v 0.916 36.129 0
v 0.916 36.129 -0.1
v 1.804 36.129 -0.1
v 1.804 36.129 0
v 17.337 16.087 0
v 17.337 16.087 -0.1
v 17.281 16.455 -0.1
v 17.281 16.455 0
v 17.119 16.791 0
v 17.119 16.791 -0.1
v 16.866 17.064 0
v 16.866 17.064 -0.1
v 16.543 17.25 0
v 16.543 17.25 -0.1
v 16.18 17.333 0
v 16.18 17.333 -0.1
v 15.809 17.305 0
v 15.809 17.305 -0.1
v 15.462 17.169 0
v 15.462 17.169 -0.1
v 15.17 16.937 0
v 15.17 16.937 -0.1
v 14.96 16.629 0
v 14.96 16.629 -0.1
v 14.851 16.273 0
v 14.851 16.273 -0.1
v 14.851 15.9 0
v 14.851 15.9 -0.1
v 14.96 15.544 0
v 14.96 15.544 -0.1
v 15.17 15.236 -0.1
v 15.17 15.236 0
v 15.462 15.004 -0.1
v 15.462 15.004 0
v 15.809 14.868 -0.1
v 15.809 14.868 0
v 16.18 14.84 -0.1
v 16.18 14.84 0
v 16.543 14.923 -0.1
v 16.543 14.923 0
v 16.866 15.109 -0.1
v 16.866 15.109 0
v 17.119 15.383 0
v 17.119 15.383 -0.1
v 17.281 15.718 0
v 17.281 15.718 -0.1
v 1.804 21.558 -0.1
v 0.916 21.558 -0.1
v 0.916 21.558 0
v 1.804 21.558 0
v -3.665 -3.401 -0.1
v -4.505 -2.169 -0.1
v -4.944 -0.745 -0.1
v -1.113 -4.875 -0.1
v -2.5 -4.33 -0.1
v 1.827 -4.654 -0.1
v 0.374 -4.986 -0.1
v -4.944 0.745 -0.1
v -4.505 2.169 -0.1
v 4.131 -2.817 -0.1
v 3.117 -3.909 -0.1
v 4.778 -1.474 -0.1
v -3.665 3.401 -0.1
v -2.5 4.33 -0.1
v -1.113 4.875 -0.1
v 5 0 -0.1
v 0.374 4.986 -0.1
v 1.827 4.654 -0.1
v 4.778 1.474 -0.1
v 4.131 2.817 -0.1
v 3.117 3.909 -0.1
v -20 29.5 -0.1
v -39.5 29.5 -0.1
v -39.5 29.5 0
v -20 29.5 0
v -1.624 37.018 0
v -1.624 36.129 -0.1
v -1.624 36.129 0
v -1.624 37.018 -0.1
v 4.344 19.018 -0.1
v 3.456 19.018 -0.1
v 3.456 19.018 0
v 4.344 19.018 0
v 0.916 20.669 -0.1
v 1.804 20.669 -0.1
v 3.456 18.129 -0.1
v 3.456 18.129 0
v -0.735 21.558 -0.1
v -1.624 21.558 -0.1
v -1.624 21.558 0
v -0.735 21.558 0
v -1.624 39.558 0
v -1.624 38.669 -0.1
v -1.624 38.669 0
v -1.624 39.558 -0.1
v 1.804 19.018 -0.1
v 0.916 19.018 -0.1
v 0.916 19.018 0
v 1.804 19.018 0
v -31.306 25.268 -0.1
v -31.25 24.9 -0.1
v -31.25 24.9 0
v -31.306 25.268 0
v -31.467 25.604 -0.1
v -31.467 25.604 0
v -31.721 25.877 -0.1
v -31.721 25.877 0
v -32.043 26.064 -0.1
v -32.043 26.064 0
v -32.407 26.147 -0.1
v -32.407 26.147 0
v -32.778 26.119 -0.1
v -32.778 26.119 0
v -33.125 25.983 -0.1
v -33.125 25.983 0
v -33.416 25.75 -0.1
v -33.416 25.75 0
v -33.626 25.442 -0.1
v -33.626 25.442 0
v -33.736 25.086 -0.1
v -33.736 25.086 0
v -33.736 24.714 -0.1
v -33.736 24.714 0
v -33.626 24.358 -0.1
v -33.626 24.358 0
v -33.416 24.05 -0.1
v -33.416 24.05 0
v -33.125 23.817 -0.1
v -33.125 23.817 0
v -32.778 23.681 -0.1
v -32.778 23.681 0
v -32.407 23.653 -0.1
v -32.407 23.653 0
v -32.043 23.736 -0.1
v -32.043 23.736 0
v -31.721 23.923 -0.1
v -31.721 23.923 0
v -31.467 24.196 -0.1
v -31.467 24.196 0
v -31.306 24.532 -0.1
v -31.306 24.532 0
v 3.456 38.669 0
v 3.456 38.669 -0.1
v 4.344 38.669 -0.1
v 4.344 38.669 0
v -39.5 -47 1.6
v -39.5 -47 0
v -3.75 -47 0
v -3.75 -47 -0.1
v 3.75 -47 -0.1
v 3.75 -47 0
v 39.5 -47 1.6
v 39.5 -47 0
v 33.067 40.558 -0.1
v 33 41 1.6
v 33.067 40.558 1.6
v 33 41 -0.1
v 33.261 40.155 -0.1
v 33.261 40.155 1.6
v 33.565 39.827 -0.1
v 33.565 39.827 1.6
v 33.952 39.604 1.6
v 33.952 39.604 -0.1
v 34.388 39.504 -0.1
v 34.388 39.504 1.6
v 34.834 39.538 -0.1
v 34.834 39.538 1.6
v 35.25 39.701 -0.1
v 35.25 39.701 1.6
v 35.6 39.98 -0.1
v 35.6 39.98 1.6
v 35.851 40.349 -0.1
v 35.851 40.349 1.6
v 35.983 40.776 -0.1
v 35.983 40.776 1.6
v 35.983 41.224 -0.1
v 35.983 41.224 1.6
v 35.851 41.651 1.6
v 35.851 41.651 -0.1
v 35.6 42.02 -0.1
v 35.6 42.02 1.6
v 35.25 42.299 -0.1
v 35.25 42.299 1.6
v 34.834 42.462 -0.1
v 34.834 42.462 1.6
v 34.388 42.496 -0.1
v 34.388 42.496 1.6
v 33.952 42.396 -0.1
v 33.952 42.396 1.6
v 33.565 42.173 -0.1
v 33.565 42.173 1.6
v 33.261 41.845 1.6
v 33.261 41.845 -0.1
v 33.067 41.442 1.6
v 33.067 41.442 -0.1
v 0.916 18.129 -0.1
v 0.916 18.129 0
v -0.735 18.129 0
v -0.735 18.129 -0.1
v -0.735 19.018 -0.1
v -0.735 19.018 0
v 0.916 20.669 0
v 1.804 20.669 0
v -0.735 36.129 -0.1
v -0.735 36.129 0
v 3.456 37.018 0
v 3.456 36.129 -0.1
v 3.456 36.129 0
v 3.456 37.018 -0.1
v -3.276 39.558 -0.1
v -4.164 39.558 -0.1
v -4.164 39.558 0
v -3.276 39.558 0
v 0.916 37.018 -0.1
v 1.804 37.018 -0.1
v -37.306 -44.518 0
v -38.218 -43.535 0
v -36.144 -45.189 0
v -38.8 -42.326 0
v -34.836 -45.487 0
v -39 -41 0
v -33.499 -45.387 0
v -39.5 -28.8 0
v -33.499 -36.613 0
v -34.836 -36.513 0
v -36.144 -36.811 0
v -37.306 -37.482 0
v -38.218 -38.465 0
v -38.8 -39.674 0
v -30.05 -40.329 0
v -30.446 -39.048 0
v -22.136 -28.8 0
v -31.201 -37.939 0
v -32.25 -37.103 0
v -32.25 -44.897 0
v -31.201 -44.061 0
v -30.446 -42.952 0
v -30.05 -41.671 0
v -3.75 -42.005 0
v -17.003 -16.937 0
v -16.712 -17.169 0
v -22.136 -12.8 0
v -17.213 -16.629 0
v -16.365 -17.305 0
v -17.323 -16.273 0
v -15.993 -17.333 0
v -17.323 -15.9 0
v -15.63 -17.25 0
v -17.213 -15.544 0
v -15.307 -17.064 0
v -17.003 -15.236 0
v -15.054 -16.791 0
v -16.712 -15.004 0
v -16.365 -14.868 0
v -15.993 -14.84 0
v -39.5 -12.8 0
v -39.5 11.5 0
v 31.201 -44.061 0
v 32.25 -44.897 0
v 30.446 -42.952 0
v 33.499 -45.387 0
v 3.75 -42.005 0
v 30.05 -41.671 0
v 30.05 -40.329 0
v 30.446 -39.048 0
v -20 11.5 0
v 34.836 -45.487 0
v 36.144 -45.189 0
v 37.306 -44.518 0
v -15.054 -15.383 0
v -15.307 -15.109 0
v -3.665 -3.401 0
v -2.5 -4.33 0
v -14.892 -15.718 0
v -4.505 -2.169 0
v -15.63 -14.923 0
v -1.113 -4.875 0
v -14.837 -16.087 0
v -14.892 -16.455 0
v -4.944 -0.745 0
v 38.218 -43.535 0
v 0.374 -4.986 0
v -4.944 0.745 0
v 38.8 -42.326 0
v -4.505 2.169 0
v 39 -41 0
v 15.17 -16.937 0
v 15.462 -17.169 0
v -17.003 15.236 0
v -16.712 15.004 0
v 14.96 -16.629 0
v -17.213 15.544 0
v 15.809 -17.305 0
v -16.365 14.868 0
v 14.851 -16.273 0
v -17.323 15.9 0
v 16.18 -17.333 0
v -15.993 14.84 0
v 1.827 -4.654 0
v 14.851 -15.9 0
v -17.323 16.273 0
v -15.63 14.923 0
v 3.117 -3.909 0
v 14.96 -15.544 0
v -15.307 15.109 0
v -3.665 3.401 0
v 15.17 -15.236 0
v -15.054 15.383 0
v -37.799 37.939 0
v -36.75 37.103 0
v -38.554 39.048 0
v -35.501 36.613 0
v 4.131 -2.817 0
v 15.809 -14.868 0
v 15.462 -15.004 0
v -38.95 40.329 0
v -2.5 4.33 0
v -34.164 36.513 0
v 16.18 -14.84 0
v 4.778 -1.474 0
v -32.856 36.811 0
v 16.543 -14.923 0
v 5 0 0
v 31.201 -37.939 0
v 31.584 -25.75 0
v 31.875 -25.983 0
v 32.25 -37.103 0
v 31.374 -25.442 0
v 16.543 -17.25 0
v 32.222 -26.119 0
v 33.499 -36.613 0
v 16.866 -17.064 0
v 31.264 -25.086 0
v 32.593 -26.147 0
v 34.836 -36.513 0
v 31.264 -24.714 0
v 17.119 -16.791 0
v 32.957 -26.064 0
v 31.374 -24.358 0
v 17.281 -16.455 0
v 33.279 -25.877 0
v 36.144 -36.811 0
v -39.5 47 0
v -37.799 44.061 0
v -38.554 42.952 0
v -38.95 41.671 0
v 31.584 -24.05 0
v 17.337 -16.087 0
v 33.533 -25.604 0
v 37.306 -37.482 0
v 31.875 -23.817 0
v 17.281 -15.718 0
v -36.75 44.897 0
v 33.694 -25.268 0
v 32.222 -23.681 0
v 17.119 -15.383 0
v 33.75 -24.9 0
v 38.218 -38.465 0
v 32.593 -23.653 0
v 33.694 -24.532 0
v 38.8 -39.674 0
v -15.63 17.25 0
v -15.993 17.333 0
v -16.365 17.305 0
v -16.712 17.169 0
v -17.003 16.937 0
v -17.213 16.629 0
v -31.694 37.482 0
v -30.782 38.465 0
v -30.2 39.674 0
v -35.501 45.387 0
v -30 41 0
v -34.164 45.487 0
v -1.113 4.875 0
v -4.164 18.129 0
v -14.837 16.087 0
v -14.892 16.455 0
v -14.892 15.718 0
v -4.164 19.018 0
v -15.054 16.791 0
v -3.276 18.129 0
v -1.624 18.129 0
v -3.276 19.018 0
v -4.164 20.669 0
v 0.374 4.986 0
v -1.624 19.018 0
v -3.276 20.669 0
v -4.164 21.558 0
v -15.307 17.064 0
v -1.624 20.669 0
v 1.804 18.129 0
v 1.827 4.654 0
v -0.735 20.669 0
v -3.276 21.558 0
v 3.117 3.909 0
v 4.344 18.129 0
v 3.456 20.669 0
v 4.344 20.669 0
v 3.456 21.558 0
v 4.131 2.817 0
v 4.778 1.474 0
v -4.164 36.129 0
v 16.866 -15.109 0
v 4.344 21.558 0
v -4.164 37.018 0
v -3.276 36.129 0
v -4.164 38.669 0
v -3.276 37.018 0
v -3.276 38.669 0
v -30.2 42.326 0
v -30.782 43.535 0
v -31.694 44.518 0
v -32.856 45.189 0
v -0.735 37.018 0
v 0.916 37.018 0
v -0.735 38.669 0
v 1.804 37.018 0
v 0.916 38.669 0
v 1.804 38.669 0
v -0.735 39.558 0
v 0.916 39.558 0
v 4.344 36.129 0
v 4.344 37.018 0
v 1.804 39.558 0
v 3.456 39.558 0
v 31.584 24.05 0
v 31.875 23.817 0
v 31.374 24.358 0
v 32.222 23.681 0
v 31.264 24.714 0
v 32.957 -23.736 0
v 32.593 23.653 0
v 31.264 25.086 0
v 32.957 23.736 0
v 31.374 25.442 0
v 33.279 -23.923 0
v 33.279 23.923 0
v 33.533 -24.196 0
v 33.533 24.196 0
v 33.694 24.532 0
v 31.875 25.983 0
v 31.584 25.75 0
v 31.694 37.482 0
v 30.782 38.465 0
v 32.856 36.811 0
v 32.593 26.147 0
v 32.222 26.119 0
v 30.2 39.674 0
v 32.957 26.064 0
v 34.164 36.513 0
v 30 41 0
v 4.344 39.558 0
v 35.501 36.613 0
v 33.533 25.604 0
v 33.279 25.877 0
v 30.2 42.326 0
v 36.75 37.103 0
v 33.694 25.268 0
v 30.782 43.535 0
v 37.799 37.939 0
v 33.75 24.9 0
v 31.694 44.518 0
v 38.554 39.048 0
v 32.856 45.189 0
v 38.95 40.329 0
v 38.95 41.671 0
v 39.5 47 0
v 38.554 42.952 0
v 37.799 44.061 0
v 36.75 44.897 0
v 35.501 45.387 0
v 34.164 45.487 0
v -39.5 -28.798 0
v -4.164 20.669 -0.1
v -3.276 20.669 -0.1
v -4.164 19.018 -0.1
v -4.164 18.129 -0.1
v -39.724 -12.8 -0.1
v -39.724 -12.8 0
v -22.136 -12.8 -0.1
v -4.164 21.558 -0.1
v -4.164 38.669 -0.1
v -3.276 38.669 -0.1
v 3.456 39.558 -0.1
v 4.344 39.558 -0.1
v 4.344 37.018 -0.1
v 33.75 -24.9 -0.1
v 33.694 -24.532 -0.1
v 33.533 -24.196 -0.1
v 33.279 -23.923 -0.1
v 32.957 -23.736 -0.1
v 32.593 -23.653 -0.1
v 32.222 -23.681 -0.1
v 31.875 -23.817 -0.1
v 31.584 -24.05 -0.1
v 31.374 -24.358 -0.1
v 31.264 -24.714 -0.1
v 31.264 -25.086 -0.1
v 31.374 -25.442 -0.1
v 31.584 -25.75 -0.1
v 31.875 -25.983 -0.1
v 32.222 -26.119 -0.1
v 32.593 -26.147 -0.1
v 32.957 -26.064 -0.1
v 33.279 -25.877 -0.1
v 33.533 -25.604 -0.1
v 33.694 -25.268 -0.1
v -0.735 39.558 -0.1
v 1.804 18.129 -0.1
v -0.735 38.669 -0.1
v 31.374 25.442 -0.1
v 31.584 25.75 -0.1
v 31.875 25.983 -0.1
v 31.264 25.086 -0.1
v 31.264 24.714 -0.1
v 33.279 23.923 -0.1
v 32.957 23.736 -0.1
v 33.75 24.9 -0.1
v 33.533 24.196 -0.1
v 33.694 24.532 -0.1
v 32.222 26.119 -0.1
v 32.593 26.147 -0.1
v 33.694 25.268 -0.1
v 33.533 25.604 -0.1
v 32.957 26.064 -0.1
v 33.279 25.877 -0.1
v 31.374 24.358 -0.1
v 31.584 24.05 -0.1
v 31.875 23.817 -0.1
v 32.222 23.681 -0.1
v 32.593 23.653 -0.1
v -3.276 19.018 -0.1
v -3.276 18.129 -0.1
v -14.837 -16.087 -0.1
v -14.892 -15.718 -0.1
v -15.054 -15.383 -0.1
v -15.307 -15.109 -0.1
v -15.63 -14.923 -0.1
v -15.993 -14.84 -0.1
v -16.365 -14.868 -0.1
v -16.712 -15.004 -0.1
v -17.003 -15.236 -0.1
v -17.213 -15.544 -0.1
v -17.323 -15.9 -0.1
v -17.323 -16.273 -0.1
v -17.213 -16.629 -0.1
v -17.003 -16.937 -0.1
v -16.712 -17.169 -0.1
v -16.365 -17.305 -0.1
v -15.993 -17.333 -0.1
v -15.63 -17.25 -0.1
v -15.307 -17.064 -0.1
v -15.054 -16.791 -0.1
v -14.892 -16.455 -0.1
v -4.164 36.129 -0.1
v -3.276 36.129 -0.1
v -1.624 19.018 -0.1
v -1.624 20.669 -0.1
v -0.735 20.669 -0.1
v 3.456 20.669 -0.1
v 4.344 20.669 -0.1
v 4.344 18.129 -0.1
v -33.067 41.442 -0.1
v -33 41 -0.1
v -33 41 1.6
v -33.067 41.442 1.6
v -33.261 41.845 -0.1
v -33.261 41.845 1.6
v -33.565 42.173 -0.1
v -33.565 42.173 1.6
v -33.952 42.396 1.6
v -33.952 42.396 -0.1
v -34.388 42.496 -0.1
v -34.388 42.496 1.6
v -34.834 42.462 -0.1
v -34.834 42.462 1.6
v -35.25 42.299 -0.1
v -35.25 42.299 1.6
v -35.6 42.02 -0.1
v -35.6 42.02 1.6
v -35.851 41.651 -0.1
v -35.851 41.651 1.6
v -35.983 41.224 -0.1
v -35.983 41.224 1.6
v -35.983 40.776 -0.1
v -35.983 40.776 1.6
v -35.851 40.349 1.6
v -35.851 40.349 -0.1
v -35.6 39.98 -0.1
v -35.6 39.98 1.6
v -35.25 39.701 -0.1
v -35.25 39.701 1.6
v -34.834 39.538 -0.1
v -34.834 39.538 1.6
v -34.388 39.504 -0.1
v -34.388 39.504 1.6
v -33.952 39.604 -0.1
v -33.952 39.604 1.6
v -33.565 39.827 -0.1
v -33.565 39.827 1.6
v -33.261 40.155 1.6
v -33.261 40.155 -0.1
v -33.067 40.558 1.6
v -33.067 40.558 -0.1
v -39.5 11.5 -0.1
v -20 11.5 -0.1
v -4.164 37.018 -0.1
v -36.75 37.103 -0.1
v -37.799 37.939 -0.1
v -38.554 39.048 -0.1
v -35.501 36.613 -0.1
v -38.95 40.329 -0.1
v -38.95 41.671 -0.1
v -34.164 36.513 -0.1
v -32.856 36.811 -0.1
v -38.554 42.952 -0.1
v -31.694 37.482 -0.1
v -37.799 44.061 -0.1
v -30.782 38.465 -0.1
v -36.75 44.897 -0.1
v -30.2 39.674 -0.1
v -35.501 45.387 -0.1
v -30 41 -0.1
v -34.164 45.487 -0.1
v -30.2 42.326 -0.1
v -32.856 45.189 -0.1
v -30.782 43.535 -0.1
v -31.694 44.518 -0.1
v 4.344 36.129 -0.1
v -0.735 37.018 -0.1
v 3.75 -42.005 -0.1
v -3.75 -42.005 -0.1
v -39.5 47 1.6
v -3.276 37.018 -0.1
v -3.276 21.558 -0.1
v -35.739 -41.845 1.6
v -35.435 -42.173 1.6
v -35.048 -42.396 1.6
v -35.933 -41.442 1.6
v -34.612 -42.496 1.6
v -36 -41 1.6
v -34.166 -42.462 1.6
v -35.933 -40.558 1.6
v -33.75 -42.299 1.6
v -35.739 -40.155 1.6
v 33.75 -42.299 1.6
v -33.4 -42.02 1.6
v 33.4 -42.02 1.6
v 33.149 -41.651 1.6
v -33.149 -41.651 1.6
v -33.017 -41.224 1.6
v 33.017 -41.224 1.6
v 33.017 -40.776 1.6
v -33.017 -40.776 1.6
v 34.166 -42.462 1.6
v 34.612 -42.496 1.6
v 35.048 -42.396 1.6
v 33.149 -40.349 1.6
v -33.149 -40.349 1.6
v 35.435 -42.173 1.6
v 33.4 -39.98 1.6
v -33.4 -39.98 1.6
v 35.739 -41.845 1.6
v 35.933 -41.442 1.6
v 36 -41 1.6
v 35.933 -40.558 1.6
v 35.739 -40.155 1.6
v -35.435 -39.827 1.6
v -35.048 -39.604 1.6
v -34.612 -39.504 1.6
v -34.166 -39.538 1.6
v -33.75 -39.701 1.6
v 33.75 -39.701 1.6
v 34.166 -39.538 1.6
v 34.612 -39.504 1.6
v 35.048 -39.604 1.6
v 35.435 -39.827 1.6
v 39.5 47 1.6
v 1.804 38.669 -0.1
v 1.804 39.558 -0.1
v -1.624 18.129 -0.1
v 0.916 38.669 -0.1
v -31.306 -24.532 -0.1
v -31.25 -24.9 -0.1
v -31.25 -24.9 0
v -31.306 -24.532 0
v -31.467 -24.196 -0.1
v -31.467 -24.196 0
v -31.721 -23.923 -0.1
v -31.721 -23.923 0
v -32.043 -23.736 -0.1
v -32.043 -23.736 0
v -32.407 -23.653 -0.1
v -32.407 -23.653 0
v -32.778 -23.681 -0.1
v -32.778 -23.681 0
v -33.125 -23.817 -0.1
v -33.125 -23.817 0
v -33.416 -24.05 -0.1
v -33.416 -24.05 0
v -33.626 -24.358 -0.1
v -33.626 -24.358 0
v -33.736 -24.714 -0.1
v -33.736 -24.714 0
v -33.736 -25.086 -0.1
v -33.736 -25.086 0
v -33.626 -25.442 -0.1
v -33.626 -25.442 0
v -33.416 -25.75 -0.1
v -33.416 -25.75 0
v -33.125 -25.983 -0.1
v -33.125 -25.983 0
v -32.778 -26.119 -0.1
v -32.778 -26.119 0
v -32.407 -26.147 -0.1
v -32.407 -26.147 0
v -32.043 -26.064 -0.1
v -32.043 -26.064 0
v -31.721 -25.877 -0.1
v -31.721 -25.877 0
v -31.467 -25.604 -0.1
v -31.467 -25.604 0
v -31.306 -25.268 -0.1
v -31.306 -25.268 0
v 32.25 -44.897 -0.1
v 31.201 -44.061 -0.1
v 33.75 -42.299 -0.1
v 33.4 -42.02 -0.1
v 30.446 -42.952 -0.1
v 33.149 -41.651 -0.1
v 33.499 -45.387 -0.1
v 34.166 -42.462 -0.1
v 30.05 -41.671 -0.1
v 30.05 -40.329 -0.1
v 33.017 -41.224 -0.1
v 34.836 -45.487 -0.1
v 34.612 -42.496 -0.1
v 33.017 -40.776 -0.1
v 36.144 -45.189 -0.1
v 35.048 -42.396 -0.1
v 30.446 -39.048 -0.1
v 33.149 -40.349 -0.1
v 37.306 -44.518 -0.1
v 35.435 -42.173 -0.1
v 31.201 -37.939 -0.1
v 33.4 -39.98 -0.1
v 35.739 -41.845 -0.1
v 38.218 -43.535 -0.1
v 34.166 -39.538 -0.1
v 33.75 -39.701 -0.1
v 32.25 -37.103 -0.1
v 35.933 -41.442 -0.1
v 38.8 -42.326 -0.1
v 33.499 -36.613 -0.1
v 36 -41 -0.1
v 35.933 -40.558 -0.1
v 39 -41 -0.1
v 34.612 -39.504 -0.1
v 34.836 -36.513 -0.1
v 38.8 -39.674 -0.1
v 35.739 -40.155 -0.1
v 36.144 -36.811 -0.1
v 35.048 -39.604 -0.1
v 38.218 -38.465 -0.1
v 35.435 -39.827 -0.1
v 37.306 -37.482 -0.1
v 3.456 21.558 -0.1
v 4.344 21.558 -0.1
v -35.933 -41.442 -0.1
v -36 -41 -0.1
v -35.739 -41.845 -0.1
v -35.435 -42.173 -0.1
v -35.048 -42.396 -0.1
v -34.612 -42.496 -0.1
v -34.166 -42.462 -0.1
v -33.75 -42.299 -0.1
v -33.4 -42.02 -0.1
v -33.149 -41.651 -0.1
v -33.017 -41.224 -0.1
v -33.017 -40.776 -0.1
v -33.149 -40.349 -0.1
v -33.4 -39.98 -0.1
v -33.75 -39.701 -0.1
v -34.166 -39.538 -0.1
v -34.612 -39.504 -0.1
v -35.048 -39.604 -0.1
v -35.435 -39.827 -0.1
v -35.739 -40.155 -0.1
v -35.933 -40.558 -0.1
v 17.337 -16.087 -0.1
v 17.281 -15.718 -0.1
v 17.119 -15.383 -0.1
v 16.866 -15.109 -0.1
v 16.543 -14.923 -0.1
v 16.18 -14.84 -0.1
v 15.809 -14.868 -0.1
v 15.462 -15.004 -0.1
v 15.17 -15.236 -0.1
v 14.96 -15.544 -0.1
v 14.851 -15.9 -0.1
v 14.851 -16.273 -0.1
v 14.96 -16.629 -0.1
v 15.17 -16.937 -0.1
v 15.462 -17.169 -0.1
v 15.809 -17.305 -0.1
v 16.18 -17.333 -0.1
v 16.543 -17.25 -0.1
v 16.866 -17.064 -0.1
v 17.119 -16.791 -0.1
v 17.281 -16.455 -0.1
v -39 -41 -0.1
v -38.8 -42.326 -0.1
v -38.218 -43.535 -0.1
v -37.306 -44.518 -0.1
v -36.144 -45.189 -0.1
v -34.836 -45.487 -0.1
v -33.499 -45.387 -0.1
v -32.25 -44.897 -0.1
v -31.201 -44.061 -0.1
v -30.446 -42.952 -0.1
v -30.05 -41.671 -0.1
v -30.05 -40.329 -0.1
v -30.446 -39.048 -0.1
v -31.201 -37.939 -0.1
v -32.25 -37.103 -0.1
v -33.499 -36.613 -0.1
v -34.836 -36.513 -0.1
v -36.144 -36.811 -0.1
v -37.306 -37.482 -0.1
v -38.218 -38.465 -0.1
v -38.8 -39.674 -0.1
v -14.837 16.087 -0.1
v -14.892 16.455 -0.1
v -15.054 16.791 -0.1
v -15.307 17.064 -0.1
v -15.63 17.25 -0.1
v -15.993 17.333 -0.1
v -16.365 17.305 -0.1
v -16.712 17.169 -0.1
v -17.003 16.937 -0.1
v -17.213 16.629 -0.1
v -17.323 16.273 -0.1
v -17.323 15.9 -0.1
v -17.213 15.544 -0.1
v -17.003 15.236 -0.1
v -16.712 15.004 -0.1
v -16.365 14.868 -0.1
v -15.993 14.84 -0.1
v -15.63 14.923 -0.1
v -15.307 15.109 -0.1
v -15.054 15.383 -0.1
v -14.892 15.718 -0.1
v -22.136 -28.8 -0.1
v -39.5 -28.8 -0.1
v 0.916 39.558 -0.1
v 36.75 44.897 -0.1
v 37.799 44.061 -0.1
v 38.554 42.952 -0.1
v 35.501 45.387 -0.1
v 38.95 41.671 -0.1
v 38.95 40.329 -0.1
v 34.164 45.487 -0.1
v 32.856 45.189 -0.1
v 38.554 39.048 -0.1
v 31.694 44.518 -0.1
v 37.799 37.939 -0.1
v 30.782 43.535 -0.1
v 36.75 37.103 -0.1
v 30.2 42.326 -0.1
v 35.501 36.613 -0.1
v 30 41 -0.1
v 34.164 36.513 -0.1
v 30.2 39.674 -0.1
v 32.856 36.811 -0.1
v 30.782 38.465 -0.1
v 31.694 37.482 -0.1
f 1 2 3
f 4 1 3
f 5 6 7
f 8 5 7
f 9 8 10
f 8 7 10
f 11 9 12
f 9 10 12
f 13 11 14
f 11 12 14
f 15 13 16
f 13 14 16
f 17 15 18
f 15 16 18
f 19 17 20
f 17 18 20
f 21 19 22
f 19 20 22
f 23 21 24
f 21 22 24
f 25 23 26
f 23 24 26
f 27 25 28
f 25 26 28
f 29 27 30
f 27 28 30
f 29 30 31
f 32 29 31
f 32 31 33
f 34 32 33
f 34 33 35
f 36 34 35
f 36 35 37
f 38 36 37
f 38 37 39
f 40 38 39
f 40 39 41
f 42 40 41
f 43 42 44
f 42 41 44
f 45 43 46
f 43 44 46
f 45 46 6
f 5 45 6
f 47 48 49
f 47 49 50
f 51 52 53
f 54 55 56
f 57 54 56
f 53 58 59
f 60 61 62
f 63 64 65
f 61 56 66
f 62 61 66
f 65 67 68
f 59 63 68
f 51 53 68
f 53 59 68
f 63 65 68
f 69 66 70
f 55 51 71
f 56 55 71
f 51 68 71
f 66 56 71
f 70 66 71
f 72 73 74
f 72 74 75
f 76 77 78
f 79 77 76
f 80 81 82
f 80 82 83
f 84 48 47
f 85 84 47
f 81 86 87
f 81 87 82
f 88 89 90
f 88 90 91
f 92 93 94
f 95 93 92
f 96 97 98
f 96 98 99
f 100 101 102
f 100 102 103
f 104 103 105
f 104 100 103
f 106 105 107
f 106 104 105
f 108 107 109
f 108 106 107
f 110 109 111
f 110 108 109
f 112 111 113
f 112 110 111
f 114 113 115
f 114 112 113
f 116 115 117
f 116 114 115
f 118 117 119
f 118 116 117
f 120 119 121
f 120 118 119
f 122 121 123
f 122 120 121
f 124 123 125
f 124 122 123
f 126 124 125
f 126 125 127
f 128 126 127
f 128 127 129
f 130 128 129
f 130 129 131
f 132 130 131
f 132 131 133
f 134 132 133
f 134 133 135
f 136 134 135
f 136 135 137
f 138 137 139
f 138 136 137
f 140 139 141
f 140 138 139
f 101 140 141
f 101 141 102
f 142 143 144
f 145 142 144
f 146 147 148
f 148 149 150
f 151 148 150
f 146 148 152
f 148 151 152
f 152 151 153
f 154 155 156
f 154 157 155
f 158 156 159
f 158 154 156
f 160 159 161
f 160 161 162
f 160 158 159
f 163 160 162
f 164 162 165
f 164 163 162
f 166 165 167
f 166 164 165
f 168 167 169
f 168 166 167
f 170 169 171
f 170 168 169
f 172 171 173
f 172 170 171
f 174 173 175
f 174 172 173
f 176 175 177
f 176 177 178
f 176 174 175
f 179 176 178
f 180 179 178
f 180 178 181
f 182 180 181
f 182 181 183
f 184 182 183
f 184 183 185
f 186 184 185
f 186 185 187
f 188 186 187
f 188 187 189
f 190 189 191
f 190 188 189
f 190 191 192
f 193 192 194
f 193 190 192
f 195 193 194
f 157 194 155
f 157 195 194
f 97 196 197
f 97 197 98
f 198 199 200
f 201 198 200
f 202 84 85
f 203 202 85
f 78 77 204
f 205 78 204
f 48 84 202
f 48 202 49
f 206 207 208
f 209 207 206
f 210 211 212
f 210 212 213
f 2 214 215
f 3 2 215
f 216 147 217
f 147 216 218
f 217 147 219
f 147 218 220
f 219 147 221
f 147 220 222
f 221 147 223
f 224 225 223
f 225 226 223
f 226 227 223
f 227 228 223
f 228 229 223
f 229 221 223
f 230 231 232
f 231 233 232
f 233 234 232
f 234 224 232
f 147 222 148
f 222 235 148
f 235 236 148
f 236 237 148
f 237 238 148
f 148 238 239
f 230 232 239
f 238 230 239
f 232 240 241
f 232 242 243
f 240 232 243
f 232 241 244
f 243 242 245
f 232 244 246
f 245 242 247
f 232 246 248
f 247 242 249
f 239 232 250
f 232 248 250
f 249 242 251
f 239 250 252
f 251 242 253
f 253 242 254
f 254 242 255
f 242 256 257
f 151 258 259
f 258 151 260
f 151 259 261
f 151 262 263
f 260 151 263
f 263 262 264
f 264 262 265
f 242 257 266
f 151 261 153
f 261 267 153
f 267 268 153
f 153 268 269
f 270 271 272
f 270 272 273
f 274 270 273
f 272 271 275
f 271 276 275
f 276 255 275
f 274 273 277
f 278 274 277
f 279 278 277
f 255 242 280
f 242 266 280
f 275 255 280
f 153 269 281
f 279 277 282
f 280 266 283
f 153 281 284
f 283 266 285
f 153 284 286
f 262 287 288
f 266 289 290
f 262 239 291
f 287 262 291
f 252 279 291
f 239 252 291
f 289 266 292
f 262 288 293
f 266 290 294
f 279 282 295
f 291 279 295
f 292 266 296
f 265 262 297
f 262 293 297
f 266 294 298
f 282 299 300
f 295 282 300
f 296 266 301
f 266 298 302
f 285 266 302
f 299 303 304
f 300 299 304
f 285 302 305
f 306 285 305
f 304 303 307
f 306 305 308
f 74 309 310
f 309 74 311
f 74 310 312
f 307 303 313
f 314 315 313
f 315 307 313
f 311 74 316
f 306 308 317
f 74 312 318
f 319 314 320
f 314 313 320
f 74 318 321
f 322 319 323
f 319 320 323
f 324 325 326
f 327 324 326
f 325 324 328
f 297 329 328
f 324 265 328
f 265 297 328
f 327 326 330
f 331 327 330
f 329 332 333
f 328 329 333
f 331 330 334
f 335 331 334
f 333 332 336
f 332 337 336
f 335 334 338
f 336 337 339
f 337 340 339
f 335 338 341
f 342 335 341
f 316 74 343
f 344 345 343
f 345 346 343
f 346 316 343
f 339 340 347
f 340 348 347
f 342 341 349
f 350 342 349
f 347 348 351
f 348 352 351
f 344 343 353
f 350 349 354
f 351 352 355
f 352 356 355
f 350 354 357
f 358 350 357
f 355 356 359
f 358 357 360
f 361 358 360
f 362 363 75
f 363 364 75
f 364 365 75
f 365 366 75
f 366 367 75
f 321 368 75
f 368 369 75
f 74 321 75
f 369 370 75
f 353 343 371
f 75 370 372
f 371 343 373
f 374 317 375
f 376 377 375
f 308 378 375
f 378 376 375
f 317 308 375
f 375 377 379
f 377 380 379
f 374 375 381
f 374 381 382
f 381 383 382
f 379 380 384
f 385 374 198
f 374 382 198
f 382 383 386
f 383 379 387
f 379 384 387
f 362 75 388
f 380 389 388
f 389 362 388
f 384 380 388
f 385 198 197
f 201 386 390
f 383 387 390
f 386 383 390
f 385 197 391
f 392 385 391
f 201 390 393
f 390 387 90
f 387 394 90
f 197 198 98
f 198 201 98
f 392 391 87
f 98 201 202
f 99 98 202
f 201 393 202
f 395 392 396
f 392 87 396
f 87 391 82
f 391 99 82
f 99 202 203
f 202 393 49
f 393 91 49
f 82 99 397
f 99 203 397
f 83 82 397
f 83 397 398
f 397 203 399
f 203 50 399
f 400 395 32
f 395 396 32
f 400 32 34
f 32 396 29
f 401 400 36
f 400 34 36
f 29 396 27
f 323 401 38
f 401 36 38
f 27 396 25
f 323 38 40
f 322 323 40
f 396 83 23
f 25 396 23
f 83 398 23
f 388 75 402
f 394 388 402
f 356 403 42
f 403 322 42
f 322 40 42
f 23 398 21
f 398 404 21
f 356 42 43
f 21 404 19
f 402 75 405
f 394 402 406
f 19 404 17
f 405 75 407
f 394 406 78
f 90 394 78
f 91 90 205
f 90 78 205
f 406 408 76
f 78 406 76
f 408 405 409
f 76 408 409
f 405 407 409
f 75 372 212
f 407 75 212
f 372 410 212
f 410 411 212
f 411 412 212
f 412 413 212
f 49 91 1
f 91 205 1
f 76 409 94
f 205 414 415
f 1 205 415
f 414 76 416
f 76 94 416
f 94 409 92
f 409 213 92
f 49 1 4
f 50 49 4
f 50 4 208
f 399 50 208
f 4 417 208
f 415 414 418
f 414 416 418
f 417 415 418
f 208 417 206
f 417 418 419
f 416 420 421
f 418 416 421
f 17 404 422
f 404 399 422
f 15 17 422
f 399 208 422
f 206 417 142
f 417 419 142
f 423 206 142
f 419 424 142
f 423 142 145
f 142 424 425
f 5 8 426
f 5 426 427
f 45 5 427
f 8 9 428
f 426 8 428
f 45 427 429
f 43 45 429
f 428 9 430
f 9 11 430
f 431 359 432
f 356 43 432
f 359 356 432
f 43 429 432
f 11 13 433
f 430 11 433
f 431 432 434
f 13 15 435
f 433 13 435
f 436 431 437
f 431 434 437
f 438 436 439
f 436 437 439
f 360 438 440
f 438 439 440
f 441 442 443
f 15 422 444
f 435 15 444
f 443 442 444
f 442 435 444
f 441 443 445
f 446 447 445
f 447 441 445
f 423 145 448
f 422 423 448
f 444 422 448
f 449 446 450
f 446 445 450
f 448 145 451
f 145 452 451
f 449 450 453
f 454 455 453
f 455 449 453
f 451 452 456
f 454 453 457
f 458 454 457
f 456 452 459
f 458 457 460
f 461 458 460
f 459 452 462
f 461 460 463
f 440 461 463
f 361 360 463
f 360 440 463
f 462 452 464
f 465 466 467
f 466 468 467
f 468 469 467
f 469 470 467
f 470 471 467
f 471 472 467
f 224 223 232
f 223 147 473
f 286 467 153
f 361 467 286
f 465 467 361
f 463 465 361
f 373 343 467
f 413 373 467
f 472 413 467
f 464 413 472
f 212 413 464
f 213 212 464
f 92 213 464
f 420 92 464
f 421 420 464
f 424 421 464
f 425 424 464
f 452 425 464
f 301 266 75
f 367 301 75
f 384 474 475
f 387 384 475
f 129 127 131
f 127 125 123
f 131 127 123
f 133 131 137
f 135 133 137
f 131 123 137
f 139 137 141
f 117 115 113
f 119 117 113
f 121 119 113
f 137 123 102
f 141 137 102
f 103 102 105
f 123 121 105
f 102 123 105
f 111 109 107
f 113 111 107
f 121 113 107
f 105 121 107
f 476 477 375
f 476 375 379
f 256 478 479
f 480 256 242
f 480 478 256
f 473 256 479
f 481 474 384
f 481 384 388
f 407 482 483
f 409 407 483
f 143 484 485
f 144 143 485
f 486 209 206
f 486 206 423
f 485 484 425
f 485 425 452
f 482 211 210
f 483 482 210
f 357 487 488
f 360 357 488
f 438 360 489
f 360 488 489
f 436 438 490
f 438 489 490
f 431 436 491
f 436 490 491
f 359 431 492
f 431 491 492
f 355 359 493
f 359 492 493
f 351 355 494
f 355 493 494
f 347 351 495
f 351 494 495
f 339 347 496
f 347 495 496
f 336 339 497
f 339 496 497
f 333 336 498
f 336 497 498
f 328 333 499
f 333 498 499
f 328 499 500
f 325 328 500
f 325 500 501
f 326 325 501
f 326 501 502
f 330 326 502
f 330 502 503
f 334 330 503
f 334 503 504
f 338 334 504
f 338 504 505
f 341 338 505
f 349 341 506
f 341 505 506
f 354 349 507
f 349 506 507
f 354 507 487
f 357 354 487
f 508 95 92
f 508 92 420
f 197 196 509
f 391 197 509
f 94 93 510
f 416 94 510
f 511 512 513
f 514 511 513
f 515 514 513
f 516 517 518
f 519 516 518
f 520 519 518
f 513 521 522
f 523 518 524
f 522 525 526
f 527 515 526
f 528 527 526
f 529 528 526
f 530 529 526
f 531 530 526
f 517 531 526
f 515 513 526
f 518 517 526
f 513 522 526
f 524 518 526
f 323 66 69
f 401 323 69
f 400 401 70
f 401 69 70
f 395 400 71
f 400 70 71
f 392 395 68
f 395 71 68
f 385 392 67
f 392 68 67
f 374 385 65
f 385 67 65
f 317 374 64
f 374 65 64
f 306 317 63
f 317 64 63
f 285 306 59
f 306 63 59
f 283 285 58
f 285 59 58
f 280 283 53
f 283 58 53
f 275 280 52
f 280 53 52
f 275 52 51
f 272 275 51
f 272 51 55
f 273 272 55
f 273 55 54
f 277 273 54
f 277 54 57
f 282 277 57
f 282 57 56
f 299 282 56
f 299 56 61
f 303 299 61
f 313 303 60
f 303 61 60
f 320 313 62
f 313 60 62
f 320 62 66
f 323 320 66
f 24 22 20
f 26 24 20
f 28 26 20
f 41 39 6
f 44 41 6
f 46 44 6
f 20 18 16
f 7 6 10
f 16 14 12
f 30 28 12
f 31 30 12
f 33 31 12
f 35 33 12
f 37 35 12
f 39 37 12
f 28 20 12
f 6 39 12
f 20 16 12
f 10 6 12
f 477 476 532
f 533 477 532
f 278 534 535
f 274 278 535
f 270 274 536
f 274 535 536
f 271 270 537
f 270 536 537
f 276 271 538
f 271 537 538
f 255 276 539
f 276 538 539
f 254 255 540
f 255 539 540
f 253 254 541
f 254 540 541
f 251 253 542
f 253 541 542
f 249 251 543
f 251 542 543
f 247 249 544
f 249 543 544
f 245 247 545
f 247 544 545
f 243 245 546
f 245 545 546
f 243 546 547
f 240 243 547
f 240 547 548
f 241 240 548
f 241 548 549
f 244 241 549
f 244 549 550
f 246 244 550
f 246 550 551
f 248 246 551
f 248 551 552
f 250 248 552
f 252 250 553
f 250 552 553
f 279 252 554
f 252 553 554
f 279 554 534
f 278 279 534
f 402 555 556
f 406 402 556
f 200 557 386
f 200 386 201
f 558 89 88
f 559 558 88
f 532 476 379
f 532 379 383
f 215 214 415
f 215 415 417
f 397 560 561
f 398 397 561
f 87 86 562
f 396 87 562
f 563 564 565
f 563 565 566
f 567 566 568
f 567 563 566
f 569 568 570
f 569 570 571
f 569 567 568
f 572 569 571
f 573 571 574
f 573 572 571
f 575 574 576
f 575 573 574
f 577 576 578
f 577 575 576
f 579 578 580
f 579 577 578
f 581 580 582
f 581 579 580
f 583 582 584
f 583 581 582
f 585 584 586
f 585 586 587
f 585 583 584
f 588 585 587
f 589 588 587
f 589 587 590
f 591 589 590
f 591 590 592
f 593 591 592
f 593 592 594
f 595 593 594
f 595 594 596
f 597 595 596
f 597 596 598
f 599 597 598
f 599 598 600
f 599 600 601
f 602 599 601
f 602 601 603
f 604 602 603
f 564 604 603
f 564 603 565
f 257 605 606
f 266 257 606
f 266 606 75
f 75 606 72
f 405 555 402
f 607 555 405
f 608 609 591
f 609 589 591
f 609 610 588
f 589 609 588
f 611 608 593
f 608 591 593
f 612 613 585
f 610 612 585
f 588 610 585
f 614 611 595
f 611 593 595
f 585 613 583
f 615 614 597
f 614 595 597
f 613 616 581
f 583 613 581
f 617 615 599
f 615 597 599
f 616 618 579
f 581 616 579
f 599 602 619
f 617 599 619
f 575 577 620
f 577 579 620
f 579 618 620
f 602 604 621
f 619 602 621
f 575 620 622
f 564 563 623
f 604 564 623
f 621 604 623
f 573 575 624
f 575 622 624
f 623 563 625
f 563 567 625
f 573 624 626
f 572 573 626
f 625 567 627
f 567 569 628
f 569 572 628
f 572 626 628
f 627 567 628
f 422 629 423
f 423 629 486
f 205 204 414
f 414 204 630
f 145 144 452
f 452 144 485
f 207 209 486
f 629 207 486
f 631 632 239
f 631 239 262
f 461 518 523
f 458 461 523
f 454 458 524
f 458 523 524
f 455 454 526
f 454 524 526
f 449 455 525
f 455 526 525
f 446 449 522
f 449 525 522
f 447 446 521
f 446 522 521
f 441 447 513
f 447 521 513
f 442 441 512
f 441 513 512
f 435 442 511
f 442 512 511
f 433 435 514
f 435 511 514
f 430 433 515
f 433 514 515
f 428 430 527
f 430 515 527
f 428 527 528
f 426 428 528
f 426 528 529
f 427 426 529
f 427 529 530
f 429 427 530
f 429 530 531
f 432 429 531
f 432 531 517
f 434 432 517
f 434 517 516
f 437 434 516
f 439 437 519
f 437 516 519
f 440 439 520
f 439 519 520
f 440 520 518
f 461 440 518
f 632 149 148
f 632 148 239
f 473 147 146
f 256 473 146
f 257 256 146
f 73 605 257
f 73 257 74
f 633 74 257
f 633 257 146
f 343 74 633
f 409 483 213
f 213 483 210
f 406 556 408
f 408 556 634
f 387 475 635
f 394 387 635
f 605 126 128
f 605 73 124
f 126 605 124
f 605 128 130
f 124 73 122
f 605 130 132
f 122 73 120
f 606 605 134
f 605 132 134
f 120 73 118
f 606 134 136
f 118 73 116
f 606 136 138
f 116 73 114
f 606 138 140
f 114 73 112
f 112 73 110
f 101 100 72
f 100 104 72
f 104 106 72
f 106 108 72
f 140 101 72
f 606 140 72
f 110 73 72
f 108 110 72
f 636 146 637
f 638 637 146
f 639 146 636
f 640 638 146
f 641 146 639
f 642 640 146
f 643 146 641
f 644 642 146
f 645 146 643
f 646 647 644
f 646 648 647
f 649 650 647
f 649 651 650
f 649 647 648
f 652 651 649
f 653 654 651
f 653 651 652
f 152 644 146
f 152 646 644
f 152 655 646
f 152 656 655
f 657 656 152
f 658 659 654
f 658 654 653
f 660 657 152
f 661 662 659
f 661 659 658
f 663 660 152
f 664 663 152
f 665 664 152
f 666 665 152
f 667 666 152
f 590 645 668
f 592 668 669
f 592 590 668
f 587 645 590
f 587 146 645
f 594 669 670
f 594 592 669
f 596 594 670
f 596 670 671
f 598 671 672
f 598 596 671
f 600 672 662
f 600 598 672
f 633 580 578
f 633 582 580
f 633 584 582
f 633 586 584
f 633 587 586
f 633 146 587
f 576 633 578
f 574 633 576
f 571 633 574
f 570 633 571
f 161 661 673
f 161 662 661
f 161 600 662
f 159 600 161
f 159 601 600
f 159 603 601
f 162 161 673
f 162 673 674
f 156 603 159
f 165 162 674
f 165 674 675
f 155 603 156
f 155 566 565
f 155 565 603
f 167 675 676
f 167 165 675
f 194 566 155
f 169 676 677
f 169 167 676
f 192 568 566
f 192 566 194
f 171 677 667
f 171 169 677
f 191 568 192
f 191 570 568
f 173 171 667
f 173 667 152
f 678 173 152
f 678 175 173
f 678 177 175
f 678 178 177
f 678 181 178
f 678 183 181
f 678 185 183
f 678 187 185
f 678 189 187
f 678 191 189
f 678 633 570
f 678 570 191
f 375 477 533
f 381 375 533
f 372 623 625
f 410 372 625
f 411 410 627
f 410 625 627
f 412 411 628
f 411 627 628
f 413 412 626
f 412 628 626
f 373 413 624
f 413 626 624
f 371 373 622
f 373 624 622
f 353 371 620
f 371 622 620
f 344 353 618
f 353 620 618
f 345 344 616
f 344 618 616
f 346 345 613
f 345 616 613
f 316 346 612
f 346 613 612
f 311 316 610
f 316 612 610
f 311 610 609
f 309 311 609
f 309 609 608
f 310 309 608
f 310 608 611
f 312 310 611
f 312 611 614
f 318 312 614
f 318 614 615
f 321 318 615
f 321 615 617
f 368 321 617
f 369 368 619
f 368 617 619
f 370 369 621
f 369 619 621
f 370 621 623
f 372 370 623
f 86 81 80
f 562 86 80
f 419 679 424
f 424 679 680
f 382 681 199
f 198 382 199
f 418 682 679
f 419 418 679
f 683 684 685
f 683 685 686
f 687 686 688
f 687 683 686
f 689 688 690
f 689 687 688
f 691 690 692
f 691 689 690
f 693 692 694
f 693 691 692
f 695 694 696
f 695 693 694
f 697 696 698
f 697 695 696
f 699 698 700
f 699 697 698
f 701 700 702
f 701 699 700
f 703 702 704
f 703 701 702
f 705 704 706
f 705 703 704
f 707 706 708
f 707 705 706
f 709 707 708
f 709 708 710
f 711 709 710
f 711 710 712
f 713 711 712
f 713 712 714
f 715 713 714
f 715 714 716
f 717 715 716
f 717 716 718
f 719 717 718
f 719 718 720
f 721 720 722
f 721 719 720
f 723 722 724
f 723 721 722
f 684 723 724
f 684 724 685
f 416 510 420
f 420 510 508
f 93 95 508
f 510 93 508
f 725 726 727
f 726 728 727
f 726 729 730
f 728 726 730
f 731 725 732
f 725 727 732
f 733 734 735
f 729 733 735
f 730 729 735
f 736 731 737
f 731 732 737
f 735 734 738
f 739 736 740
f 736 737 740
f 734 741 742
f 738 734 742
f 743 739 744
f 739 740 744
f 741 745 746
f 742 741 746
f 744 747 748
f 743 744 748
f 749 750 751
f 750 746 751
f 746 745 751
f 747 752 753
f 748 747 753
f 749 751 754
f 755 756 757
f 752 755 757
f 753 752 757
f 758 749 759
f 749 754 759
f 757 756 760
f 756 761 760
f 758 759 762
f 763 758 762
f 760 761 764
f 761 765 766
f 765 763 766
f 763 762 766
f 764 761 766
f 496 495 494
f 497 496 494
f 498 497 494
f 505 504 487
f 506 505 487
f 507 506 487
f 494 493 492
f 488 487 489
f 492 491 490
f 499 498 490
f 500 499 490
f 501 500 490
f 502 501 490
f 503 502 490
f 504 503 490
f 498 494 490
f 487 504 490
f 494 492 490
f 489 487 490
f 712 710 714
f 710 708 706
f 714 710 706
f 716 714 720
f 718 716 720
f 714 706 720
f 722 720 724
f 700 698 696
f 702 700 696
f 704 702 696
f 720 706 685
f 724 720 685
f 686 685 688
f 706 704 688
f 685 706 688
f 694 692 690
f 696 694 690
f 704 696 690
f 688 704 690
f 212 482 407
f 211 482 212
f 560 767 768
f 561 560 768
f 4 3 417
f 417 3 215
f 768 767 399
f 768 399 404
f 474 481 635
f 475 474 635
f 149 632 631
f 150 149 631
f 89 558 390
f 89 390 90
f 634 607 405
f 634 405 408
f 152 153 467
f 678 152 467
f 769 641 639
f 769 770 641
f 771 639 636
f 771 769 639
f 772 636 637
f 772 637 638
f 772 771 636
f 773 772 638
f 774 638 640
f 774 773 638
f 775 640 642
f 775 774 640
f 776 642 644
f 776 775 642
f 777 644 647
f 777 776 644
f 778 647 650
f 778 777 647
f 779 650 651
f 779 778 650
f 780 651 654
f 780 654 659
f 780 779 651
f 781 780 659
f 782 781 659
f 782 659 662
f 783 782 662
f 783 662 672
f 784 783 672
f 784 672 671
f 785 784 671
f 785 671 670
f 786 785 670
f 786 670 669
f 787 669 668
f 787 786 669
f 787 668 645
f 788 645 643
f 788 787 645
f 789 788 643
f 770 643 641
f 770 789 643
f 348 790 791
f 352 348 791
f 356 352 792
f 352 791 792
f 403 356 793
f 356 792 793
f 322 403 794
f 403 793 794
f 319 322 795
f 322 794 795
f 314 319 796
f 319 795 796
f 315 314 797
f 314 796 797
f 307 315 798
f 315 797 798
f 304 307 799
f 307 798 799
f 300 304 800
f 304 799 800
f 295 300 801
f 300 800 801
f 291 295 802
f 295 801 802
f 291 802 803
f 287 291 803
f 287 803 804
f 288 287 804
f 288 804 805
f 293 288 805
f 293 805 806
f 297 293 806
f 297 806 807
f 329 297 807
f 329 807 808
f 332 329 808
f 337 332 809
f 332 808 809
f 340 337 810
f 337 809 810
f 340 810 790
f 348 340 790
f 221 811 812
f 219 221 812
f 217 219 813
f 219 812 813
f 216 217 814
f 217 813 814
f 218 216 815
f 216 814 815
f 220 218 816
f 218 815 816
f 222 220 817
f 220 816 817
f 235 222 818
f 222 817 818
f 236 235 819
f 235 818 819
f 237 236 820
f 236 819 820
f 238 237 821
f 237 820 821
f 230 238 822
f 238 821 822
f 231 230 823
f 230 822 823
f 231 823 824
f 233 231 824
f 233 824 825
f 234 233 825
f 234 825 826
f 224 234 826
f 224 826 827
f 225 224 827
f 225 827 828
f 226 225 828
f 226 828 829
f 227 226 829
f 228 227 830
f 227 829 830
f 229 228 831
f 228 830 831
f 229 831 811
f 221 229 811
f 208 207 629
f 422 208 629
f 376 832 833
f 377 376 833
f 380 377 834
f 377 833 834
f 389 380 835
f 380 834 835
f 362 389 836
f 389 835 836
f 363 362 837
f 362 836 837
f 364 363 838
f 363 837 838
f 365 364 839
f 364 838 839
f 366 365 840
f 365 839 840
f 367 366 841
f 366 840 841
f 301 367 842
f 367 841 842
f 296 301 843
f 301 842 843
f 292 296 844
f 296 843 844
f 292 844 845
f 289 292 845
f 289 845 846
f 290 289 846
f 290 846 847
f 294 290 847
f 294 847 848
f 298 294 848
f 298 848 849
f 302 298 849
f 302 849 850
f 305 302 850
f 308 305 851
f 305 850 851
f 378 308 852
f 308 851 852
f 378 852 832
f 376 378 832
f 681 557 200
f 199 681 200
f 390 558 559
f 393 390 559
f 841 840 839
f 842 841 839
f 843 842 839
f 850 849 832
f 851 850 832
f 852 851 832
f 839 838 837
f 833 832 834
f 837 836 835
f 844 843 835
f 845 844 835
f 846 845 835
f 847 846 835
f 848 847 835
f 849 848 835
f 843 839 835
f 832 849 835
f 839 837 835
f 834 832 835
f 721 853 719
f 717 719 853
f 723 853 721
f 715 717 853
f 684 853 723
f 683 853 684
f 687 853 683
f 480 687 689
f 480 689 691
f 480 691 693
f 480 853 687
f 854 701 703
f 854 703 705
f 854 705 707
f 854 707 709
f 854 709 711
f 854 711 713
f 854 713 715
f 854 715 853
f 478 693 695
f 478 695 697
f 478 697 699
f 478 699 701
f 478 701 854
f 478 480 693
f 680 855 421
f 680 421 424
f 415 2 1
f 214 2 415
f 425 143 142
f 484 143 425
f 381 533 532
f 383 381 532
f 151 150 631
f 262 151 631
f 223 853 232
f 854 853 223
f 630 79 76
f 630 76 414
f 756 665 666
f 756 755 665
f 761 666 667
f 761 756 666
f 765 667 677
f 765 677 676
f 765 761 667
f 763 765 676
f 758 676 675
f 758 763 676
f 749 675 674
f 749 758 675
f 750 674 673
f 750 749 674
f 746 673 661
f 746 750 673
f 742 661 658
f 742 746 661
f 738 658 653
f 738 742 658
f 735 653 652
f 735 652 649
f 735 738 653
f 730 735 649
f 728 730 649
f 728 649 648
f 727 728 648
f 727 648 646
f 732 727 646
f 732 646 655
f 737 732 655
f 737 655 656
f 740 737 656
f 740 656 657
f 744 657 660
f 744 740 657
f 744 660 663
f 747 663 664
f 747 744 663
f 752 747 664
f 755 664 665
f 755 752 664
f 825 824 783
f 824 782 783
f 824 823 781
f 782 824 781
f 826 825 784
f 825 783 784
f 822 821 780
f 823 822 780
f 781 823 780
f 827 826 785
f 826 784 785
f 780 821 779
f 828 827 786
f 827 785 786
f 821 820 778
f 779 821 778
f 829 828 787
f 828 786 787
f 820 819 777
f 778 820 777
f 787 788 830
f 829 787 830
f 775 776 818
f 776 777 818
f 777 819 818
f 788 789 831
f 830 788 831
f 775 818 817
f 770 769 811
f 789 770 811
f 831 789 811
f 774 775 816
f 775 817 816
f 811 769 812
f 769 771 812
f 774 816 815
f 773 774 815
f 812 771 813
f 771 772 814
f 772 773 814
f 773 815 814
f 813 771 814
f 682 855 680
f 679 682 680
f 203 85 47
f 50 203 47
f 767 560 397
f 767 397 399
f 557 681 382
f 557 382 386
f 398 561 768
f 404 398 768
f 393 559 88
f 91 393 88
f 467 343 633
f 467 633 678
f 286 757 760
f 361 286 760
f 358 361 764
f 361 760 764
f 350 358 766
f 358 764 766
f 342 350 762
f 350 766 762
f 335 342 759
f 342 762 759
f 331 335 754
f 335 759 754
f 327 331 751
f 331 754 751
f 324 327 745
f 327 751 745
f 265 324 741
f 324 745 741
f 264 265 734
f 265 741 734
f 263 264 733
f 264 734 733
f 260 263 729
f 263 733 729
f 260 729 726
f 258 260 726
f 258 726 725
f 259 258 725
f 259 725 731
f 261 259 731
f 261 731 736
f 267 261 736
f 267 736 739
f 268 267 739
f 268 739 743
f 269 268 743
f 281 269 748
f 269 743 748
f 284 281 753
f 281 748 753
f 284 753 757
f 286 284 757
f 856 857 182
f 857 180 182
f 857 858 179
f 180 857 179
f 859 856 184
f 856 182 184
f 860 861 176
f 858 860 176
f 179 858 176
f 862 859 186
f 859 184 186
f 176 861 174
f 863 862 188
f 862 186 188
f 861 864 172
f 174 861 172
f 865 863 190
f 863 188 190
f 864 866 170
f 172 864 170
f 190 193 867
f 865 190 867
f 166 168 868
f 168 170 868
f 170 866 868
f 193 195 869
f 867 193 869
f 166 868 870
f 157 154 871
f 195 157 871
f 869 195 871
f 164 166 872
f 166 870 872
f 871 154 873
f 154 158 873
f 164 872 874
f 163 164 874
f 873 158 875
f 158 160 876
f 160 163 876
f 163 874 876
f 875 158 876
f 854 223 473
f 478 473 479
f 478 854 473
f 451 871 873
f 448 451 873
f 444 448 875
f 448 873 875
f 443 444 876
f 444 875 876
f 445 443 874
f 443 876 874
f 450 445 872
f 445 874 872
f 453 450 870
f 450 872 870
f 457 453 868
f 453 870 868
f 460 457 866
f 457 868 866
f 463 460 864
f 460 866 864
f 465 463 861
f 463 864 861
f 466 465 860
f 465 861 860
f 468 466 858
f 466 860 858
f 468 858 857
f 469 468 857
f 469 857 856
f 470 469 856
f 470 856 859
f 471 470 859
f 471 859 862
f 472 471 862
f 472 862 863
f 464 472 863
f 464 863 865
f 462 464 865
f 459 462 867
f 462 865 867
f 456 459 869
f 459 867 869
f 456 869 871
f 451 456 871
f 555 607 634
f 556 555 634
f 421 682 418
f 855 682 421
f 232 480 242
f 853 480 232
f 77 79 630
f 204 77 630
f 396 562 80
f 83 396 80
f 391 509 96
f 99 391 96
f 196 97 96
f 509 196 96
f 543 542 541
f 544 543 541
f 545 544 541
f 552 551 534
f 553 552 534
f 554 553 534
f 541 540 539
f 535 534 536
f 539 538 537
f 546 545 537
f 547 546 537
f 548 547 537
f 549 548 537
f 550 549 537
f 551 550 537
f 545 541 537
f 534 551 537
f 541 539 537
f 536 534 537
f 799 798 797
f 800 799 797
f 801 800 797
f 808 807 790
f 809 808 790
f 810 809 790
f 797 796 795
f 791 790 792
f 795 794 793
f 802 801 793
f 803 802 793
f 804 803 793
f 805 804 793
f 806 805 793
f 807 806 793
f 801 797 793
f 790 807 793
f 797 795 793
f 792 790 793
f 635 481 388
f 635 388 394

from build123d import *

# Parameters (mm, degrees)
SKETCH1_W           = 79
SKETCH1_H           = 94
SKETCH1_R           = 1.5
BOSS_EXTRUDE1_DEPTH = 1.6
BOSS_EXTRUDE2_START = -0.1
SKETCH2_R           = 5
SKETCH2_R_2         = 1.25
SKETCH2_R_3         = 4.5
SKETCH2_R_4         = 1.5
SKETCH2_W           = 0.889
SKETCH2_H           = 0.889
SKETCH2_W_2         = 19.5
SKETCH2_H_2         = 18
SKETCH2_W_3         = 7.5
SKETCH2_H_3         = 4.995279521
BOSS_EXTRUDE2_DEPTH = 0.1


with BuildPart() as part:
    # Sketch1 → Boss-Extrude1 (new body)
    with BuildSketch(Plane.XY):
        Rectangle(SKETCH1_W, SKETCH1_H)
        with Locations((-34.5, 41)):
            Circle(SKETCH1_R, mode=Mode.SUBTRACT)
        with Locations(Location((34.5, 41, 0), (0, 0, 180))):
            Circle(SKETCH1_R, mode=Mode.SUBTRACT)
        with Locations((34.5, -41)):
            Circle(SKETCH1_R, mode=Mode.SUBTRACT)
        with Locations(Location((-34.5, -41, 0), (0, 0, 180))):
            Circle(SKETCH1_R, mode=Mode.SUBTRACT)
    extrude(amount=BOSS_EXTRUDE1_DEPTH)

    # Sketch2 → Boss-Extrude2 (add)
    # profile 1 of 30: a face of its own
    with BuildSketch(Plane.XY.offset(BOSS_EXTRUDE2_START)):
        Circle(SKETCH2_R)
    # profile 2 of 30: a face of its own
    with BuildSketch(Plane.XY.offset(BOSS_EXTRUDE2_START)):
        with Locations((-16.086679272, 16.086679272)):
            Circle(SKETCH2_R_2)
    # profile 3 of 30: a face of its own
    with BuildSketch(Plane.XY.offset(BOSS_EXTRUDE2_START)):
        with Locations((16.086679272, 16.086679272)):
            Circle(SKETCH2_R_2)
    # profile 4 of 30: a face of its own
    with BuildSketch(Plane.XY.offset(BOSS_EXTRUDE2_START)):
        with Locations((32.5, 24.9)):
            Circle(SKETCH2_R_2)
    # profile 5 of 30: a face of its own
    with BuildSketch(Plane.XY.offset(BOSS_EXTRUDE2_START)):
        with Locations((16.086679272, -16.086679272)):
            Circle(SKETCH2_R_2)
    # profile 6 of 30: a face of its own
    with BuildSketch(Plane.XY.offset(BOSS_EXTRUDE2_START)):
        with Locations((32.5, -24.9)):
            Circle(SKETCH2_R_2)
    # profile 7 of 30: a face of its own
    with BuildSketch(Plane.XY.offset(BOSS_EXTRUDE2_START)):
        with Locations((-16.086679272, -16.086679272)):
            Circle(SKETCH2_R_2)
    # profile 8 of 30: a face of its own
    with BuildSketch(Plane.XY.offset(BOSS_EXTRUDE2_START)):
        with Locations((-34.5, 41)):
            Circle(SKETCH2_R_3)
        with Locations((-34.5, 41)):
            Circle(SKETCH2_R_4, mode=Mode.SUBTRACT)
    # profile 9 of 30: a face of its own
    with BuildSketch(Plane.XY.offset(BOSS_EXTRUDE2_START)):
        with Locations(Location((34.5, 41, 0), (0, 0, 180))):
            Circle(SKETCH2_R_3)
        with Locations(Location((34.5, 41, 0), (0, 0, 180))):
            Circle(SKETCH2_R_4, mode=Mode.SUBTRACT)
    # profile 10 of 30: a face of its own
    with BuildSketch(Plane.XY.offset(BOSS_EXTRUDE2_START)):
        with Locations(Location((-34.5, -41, 0), (0, 0, 180))):
            Circle(SKETCH2_R_3)
        with Locations(Location((-34.5, -41, 0), (0, 0, 180))):
            Circle(SKETCH2_R_4, mode=Mode.SUBTRACT)
    # profile 11 of 30: a face of its own
    with BuildSketch(Plane.XY.offset(BOSS_EXTRUDE2_START)):
        with Locations((34.5, -41)):
            Circle(SKETCH2_R_3)
        with Locations((34.5, -41)):
            Circle(SKETCH2_R_4, mode=Mode.SUBTRACT)
    # profile 12 of 30: a face of its own
    with BuildSketch(Plane.XY.offset(BOSS_EXTRUDE2_START)):
        with Locations((-3.72, 39.1133)):
            Rectangle(SKETCH2_W, SKETCH2_H)
    # profile 13 of 30: a face of its own
    with BuildSketch(Plane.XY.offset(BOSS_EXTRUDE2_START)):
        with Locations((-1.18, 39.1133)):
            Rectangle(SKETCH2_W, SKETCH2_H)
    # profile 14 of 30: a face of its own
    with BuildSketch(Plane.XY.offset(BOSS_EXTRUDE2_START)):
        with Locations((1.36, 39.1133)):
            Rectangle(SKETCH2_W, SKETCH2_H)
    # profile 15 of 30: a face of its own
    with BuildSketch(Plane.XY.offset(BOSS_EXTRUDE2_START)):
        with Locations((3.9, 39.1133)):
            Rectangle(SKETCH2_W, SKETCH2_H)
    # profile 16 of 30: a face of its own
    with BuildSketch(Plane.XY.offset(BOSS_EXTRUDE2_START)):
        with Locations((-3.72, 36.5733)):
            Rectangle(SKETCH2_W, SKETCH2_H)
    # profile 17 of 30: a face of its own
    with BuildSketch(Plane.XY.offset(BOSS_EXTRUDE2_START)):
        with Locations((-1.18, 36.5733)):
            Rectangle(SKETCH2_W, SKETCH2_H)
    # profile 18 of 30: a face of its own
    with BuildSketch(Plane.XY.offset(BOSS_EXTRUDE2_START)):
        with Locations((1.36, 36.5733)):
            Rectangle(SKETCH2_W, SKETCH2_H)
    # profile 19 of 30: a face of its own
    with BuildSketch(Plane.XY.offset(BOSS_EXTRUDE2_START)):
        with Locations((3.9, 36.5733)):
            Rectangle(SKETCH2_W, SKETCH2_H)
    # profile 20 of 30: a face of its own
    with BuildSketch(Plane.XY.offset(BOSS_EXTRUDE2_START)):
        with Locations((-3.72, 21.1133)):
            Rectangle(SKETCH2_W, SKETCH2_H)
    # profile 21 of 30: a face of its own
    with BuildSketch(Plane.XY.offset(BOSS_EXTRUDE2_START)):
        with Locations((-1.18, 21.1133)):
            Rectangle(SKETCH2_W, SKETCH2_H)
    # profile 22 of 30: a face of its own
    with BuildSketch(Plane.XY.offset(BOSS_EXTRUDE2_START)):
        with Locations((1.36, 21.1133)):
            Rectangle(SKETCH2_W, SKETCH2_H)
    # profile 23 of 30: a face of its own
    with BuildSketch(Plane.XY.offset(BOSS_EXTRUDE2_START)):
        with Locations((3.9, 21.1133)):
            Rectangle(SKETCH2_W, SKETCH2_H)
    # profile 24 of 30: a face of its own
    with BuildSketch(Plane.XY.offset(BOSS_EXTRUDE2_START)):
        with Locations((-3.72, 18.5733)):
            Rectangle(SKETCH2_W, SKETCH2_H)
    # profile 25 of 30: a face of its own
    with BuildSketch(Plane.XY.offset(BOSS_EXTRUDE2_START)):
        with Locations((-1.18, 18.5733)):
            Rectangle(SKETCH2_W, SKETCH2_H)
    # profile 26 of 30: a face of its own
    with BuildSketch(Plane.XY.offset(BOSS_EXTRUDE2_START)):
        with Locations((1.36, 18.5733)):
            Rectangle(SKETCH2_W, SKETCH2_H)
    # profile 27 of 30: a face of its own
    with BuildSketch(Plane.XY.offset(BOSS_EXTRUDE2_START)):
        with Locations((3.9, 18.5733)):
            Rectangle(SKETCH2_W, SKETCH2_H)
    # profile 28 of 30: a face of its own
    with BuildSketch(Plane.XY.offset(BOSS_EXTRUDE2_START)):
        with Locations((-29.75, 20.5)):
            Rectangle(SKETCH2_W_2, SKETCH2_H_2)
        with Locations((-32.5, 24.9)):
            Circle(SKETCH2_R_2, mode=Mode.SUBTRACT)
    # profile 29 of 30: a face of its own
    with BuildSketch(Plane.XY.offset(BOSS_EXTRUDE2_START)):
        with Locations((0, -44.502360239)):
            Rectangle(SKETCH2_W_3, SKETCH2_H_3)
    # profile 30 of 30: a face of its own
    with BuildSketch(Plane.XY.offset(BOSS_EXTRUDE2_START)):
        Polygon((-39.724379768, -12.8), (-22.135781761, -12.8), (-22.135781761, -28.8), (-39.499973122, -28.8), align=None)
        with Locations((-32.5, -24.9)):
            Circle(SKETCH2_R_2, mode=Mode.SUBTRACT)
    extrude(amount=BOSS_EXTRUDE2_DEPTH)


solid = part.part
